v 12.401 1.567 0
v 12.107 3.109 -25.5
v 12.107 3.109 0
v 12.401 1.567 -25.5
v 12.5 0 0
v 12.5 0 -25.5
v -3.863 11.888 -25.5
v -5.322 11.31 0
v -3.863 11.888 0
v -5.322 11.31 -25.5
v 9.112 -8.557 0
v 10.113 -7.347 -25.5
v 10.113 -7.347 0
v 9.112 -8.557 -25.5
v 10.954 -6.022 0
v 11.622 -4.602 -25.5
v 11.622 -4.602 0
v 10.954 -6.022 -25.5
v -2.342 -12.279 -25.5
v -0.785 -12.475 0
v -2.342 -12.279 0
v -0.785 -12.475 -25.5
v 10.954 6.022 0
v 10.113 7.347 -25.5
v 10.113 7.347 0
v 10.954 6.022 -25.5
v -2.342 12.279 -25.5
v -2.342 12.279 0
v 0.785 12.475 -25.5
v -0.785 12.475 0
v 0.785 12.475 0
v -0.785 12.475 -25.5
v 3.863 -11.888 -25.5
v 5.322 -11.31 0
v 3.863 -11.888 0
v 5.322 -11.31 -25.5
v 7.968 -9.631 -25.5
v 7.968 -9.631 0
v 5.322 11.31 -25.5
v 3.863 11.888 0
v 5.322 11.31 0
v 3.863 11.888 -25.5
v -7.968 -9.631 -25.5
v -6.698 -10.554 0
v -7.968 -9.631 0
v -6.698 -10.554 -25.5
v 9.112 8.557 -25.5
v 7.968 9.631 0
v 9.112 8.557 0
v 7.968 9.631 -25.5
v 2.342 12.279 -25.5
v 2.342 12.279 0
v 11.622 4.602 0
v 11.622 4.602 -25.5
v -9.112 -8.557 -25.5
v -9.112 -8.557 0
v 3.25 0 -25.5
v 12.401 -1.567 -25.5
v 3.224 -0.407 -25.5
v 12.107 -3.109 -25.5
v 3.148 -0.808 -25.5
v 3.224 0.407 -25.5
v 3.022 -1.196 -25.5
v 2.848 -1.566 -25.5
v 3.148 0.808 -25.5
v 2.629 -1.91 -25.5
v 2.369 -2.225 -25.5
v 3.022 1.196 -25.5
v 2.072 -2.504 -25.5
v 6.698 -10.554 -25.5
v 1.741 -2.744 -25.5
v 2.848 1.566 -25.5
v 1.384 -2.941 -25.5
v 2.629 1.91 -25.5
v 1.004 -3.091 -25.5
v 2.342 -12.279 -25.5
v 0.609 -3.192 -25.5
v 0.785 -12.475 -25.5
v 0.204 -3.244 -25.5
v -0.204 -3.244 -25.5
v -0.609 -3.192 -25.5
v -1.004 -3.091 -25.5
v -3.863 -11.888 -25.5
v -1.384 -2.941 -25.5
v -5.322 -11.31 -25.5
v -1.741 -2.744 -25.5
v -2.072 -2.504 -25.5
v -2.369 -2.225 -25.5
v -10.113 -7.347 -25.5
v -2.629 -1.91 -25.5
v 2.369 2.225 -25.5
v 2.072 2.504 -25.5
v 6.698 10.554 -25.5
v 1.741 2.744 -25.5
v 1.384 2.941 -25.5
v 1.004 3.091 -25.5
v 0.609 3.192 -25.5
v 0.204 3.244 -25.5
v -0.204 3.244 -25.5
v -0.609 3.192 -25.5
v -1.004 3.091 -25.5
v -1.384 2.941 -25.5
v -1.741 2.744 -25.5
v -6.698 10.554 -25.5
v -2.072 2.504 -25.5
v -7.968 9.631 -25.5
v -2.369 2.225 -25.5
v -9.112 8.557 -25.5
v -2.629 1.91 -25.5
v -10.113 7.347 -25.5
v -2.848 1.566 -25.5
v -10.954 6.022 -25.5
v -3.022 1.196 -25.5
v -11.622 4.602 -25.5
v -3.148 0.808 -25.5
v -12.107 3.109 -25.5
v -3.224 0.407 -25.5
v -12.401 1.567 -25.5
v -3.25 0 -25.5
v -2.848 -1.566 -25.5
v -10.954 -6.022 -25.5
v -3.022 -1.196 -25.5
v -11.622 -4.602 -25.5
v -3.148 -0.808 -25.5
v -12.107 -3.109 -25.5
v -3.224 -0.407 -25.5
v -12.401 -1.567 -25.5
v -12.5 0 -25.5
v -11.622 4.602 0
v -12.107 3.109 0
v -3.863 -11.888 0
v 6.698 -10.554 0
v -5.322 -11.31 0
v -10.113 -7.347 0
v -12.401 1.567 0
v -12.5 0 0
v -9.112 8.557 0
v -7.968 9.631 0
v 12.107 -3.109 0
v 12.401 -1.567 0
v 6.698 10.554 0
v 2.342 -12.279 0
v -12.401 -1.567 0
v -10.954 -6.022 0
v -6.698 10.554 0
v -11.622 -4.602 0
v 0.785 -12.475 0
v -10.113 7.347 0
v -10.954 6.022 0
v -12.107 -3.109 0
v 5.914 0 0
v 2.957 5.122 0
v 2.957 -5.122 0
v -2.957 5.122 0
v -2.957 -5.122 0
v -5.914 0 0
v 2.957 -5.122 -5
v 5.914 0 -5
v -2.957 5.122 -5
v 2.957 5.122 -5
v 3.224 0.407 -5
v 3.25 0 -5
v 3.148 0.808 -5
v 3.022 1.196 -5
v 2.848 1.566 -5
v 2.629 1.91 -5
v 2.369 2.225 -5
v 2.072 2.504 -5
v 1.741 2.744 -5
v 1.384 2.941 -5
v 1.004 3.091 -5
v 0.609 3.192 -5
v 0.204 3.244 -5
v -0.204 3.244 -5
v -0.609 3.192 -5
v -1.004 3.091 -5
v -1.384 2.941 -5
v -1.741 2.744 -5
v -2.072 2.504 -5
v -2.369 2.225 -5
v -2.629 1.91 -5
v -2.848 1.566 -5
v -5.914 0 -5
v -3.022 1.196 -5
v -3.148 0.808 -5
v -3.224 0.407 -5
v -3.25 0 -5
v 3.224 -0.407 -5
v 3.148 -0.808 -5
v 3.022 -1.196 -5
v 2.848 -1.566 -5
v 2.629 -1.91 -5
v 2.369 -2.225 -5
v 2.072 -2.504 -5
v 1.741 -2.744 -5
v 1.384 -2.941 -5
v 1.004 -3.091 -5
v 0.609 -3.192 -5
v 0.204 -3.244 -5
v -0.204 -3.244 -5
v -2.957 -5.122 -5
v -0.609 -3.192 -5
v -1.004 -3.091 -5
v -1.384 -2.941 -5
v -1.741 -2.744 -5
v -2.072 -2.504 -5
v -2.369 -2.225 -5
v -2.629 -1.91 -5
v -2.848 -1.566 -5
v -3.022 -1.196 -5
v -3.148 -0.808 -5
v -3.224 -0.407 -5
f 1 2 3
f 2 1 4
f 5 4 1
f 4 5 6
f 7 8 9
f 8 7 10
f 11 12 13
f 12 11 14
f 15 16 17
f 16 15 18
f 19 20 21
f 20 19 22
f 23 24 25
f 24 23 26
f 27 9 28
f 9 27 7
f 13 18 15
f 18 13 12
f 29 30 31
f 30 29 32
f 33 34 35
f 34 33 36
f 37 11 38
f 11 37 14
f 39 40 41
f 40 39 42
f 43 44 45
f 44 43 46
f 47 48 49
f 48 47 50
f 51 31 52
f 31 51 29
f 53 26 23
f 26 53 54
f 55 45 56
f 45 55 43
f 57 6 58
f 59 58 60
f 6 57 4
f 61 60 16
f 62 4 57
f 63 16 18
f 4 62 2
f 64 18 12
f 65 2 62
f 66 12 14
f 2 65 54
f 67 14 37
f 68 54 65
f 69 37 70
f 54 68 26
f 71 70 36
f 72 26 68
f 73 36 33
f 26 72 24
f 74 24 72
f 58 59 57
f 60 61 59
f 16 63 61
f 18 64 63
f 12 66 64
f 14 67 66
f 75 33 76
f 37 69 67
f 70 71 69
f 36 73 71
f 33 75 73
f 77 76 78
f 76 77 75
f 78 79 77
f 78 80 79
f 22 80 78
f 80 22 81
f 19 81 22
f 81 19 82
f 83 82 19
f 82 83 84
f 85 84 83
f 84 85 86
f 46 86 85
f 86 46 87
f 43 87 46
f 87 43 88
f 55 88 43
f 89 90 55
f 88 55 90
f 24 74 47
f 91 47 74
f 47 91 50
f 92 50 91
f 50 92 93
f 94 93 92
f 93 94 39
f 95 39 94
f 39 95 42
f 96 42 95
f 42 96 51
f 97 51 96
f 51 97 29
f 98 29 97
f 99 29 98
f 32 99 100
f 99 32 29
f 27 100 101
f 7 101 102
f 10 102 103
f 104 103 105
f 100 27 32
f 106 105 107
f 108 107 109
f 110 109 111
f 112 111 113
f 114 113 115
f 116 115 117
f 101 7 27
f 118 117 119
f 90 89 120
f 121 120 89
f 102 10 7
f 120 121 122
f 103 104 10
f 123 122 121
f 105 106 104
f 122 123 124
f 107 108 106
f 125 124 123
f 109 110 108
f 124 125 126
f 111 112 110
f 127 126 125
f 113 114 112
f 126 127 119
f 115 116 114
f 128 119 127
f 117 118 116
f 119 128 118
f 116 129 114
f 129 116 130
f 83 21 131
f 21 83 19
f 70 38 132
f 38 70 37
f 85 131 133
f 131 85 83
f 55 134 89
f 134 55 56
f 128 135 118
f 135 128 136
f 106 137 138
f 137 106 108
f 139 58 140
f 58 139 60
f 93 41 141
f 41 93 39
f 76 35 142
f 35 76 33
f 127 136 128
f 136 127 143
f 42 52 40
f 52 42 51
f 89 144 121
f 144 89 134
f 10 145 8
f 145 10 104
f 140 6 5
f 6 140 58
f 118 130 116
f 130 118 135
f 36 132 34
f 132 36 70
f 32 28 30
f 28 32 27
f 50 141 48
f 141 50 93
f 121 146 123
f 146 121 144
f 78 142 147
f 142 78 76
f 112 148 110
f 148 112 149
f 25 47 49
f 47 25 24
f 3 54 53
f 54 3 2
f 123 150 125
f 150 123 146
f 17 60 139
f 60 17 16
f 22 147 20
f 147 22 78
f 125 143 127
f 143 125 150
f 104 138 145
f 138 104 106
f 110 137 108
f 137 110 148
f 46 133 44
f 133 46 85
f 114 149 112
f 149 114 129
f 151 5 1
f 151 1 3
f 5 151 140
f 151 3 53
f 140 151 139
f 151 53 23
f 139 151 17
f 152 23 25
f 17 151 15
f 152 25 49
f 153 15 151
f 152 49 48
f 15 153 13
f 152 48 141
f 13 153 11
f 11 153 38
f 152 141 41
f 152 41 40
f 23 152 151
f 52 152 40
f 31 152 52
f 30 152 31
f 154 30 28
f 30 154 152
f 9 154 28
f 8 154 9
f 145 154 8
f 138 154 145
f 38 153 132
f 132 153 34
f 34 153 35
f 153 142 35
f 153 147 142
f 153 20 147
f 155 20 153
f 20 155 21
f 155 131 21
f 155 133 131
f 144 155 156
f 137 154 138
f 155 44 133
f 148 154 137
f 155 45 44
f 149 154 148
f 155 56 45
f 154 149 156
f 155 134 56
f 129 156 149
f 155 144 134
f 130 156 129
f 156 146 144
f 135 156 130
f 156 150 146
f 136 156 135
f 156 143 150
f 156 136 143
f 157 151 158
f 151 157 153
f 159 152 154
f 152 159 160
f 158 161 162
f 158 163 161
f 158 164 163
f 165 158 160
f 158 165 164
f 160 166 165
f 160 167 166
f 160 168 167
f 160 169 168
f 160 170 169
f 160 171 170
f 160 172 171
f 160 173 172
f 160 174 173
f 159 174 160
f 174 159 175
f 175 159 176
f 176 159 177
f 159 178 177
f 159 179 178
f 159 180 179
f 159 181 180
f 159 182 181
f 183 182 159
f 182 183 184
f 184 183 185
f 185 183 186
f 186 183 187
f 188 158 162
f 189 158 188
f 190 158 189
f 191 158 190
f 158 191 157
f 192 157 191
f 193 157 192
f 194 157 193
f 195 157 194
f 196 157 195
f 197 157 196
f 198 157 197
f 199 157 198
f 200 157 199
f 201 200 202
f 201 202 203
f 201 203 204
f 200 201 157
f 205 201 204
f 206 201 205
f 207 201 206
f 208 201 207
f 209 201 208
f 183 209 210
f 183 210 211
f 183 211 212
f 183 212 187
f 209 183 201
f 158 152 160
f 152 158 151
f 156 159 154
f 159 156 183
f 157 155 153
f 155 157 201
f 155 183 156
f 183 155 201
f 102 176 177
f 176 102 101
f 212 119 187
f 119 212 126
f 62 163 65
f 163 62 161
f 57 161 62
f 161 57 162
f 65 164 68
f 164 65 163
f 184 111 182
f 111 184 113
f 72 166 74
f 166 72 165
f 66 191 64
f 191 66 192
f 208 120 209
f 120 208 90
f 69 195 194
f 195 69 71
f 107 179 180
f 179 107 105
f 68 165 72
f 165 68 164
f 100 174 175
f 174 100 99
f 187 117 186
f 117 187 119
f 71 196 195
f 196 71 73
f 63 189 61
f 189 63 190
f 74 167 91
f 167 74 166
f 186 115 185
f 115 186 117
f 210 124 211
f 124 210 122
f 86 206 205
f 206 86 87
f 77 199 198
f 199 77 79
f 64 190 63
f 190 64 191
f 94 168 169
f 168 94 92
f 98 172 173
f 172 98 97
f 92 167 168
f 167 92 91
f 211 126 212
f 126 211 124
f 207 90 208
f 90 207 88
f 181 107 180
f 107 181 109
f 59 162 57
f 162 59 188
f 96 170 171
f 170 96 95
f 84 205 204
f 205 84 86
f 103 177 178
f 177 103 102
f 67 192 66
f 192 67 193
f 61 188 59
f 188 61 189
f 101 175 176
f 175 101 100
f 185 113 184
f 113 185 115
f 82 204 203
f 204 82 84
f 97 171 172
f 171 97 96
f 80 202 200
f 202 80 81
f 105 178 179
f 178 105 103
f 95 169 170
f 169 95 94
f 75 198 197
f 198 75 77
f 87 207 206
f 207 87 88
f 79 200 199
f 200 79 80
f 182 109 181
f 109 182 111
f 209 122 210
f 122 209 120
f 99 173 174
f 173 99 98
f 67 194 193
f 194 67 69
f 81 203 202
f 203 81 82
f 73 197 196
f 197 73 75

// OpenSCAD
$fn = 50;

difference() {
	union() {
		translate(v = [0, 0, -25.5]) {
			cylinder(h = 25.5, r = 12.5);
		}
		#translate(v = [0, 0, -27.0]) {
			cylinder(h = 27, r = 2.875);
		}
	}
	union() {
		translate(v = [0, 0, 0]) {
			rotate(a = [0, 0, 0]) {
				difference() {
					union() {
						translate(v = [0, 0, -5]) {
							linear_extrude(height = 5) {
								polygon(points = [[5.914249999999999, 0.0], [2.957125, 5.1218907443321156], [-2.9571249999999982, 5.1218907443321156], [-5.914249999999999, 7.242867331857232e-16], [-2.9571250000000022, -5.121890744332115], [2.9571249999999956, -5.121890744332118]]);
							}
						}
					}
					union();
				}
			}
		}
		#translate(v = [0, 0, -100.0]) {
			cylinder(h = 200, r = 3.25);
		}
	}
}
